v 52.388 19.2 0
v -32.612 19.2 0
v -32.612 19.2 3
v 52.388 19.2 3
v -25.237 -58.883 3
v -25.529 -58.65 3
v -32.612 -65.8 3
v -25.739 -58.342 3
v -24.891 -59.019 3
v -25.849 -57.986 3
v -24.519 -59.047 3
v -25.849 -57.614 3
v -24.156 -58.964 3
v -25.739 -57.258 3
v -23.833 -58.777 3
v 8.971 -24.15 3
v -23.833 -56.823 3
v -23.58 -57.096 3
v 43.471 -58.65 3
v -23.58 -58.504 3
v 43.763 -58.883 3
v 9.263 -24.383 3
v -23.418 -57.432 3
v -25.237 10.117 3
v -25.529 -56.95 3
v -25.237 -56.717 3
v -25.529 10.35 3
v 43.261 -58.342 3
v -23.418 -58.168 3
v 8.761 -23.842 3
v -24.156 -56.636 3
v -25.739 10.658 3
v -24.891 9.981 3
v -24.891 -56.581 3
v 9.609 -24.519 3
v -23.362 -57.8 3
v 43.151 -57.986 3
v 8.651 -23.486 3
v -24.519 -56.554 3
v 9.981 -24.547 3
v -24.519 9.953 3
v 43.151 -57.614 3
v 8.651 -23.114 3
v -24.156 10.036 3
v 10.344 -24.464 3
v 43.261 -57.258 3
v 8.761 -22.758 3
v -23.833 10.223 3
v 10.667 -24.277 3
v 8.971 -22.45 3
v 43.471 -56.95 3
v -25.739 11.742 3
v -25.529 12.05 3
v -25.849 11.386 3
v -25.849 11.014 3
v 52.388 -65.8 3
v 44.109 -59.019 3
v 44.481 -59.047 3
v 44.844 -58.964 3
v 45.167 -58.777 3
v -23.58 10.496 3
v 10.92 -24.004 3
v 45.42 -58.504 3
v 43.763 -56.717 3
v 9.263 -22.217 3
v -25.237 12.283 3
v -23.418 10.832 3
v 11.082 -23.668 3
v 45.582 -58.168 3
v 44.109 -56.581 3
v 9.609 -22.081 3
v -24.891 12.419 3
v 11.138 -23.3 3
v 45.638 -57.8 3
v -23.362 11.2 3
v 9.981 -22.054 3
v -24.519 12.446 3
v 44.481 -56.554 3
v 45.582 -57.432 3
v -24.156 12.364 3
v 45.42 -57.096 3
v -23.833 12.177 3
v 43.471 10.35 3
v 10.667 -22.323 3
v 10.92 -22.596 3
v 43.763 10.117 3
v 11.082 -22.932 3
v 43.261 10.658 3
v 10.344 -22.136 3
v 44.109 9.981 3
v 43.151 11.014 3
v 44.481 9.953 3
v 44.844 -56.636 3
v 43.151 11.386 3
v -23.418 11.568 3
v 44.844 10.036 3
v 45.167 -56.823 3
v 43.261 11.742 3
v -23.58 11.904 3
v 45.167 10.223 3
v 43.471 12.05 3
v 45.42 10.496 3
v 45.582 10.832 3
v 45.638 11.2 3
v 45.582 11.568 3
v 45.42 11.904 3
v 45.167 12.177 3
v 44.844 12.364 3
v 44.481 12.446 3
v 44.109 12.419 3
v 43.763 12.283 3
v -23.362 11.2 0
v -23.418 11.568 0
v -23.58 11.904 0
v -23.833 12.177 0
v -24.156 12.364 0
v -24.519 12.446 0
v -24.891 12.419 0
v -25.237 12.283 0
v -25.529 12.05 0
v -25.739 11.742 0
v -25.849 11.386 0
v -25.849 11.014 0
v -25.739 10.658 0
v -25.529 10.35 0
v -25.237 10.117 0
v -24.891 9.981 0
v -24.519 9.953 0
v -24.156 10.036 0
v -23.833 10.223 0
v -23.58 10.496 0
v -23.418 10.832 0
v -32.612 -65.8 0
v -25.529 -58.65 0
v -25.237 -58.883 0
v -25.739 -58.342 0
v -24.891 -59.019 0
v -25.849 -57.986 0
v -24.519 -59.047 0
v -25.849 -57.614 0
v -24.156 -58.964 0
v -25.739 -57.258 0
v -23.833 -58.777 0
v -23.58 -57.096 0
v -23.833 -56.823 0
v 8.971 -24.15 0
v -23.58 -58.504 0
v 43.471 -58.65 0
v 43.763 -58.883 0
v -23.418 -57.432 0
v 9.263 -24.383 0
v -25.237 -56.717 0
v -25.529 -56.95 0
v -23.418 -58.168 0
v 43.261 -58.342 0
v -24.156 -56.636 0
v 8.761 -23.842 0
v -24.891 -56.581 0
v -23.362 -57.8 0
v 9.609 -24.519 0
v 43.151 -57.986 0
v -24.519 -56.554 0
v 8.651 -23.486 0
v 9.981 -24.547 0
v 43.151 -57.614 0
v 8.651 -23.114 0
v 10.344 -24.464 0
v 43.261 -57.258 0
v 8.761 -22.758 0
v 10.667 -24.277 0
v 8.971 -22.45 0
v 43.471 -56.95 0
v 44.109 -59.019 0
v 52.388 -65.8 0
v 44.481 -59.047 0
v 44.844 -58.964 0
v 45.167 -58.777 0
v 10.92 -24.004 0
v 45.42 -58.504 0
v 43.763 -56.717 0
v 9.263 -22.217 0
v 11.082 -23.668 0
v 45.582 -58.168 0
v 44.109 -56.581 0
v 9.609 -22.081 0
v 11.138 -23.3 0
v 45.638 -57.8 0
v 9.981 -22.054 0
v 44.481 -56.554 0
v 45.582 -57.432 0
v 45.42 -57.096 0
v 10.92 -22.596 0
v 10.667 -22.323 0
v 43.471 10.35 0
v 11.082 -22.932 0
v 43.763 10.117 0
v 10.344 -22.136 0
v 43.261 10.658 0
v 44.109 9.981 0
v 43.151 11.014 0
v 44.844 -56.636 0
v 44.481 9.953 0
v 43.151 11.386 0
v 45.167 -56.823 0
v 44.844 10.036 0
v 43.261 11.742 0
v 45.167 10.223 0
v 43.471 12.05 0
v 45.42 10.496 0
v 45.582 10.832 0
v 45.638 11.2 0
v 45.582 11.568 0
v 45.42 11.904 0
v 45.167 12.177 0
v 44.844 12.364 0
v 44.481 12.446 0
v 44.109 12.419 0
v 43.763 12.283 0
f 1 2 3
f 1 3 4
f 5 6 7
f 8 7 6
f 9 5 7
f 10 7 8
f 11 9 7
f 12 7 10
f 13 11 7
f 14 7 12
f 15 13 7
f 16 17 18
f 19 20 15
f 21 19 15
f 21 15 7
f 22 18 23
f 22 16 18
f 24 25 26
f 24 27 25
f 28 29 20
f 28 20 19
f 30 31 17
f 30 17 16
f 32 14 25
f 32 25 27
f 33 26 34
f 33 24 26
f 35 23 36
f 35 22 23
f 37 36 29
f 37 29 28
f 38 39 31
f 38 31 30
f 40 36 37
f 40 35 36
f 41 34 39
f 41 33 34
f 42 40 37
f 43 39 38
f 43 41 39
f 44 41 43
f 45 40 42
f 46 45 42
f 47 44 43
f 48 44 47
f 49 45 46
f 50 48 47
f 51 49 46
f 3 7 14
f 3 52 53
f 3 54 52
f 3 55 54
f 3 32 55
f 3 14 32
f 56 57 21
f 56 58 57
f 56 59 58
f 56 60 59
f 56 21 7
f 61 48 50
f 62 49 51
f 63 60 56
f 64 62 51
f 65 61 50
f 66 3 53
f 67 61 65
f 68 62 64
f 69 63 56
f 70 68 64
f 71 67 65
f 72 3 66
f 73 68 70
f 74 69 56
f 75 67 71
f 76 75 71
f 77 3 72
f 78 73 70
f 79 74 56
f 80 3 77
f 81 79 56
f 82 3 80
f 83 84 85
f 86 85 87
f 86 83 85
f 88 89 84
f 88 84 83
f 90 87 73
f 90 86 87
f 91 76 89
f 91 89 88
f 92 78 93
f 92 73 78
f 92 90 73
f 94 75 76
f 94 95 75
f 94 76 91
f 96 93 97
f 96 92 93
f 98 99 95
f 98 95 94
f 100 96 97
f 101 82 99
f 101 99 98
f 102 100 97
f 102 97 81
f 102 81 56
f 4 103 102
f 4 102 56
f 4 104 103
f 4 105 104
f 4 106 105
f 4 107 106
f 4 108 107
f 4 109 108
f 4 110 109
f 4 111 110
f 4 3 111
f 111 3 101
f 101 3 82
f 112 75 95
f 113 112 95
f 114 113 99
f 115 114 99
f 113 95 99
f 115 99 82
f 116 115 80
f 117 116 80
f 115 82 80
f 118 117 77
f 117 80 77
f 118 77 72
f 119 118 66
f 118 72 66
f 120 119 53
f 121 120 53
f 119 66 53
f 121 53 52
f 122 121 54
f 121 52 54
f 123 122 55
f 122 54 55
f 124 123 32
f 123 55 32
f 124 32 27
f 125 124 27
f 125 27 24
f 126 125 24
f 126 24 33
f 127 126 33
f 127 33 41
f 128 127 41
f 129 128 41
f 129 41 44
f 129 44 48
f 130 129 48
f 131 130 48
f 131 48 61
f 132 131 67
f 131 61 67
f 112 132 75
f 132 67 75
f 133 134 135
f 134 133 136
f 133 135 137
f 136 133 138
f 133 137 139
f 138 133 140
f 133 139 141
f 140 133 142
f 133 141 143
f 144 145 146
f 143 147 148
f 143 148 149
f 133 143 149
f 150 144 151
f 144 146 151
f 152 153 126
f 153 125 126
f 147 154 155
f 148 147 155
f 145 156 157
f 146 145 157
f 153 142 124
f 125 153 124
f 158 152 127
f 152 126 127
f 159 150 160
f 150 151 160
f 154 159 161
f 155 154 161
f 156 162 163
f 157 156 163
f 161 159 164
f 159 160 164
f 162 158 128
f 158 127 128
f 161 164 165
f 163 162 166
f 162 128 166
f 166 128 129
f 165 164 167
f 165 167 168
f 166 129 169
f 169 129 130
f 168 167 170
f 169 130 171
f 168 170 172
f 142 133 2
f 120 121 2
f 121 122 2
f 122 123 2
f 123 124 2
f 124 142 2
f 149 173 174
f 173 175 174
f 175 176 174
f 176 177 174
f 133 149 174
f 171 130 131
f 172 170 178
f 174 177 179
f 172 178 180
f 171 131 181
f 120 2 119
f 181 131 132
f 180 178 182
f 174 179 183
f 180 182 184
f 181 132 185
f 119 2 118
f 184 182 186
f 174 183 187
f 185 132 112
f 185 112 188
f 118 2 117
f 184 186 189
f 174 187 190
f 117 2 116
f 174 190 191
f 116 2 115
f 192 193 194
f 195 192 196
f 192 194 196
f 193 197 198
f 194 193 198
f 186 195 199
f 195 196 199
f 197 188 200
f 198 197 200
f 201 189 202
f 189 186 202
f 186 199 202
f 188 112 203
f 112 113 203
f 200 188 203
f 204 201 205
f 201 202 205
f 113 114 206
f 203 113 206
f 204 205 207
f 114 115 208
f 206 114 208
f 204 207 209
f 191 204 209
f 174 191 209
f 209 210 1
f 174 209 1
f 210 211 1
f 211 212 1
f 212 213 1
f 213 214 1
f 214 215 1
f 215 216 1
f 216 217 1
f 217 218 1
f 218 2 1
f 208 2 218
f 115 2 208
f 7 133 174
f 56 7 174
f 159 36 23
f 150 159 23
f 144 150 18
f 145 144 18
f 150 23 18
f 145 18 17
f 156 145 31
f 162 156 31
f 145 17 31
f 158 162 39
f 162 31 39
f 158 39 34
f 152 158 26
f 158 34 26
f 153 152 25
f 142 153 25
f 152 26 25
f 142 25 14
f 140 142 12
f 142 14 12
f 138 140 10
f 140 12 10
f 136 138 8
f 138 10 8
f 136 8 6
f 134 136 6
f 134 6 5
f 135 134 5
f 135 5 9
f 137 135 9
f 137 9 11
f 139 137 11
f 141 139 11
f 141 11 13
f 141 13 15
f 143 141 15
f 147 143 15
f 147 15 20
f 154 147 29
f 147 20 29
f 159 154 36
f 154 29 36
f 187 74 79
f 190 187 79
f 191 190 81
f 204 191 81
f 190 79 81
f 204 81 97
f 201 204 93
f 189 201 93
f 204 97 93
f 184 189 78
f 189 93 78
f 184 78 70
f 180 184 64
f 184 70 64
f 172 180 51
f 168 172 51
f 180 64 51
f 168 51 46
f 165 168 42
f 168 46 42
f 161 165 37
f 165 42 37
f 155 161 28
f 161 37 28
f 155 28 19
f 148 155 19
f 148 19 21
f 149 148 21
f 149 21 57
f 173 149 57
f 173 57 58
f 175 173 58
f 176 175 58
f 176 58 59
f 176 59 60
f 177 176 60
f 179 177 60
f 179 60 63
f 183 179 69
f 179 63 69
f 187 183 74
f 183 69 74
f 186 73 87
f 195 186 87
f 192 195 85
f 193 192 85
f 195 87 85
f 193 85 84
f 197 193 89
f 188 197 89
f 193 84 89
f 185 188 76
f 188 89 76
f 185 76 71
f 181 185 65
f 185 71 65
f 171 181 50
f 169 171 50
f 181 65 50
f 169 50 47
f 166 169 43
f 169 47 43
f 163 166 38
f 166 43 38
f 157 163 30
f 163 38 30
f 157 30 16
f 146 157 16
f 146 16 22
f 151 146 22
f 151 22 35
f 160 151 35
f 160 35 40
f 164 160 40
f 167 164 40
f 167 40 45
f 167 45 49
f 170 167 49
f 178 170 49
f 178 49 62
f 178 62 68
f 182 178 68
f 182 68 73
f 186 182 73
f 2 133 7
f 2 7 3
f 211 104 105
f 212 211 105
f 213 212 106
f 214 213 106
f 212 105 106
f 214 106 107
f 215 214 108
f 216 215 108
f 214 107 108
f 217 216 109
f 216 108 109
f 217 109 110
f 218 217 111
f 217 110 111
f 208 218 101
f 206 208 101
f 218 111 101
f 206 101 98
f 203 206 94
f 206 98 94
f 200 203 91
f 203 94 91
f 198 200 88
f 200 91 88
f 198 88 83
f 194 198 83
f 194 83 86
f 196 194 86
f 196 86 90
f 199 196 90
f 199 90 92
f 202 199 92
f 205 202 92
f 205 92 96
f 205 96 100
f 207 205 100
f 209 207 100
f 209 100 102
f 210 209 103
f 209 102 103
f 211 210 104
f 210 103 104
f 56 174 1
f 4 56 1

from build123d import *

# Parameters (mm, degrees)
ESQUISSE1_W             = 85
ESQUISSE1_H             = 85
BOSS_EXTRU_1_DEPTH      = 3
ESQUISSE2_R             = 1.25
ENL_V_MAT_EXTRU_1_DEPTH = 3
ESQUISSE3_R             = 1.25
ENL_V_MAT_EXTRU_2_DEPTH = 10


with BuildPart() as part:
    # Esquisse1 → Boss.-Extru.1 (new body)
    with BuildSketch(Plane.XY):
        with Locations((9.887537717, -23.300013855)):
            Rectangle(ESQUISSE1_W, ESQUISSE1_H)
    extrude(amount=BOSS_EXTRU_1_DEPTH)

    # Esquisse2 → Enlèv. mat.-Extru.1 (cut)
    with BuildSketch(Plane.XY.offset(3)):
        with Locations((-24.612462283, 11.199986145)):
            Circle(ESQUISSE2_R)
        with Locations((44.387537717, 11.199986145)):
            Circle(ESQUISSE2_R)
        with Locations((-24.612462283, -57.800013855)):
            Circle(ESQUISSE2_R)
        with Locations((44.387537717, -57.800013855)):
            Circle(ESQUISSE2_R)
    extrude(amount=-ENL_V_MAT_EXTRU_1_DEPTH, mode=Mode.SUBTRACT)

    # Esquisse3 → Enlèv. mat.-Extru.2 (cut)
    with BuildSketch(Plane.XY.offset(3)):
        with Locations((9.887537717, -23.300013855)):
            Circle(ESQUISSE3_R)
    extrude(amount=-ENL_V_MAT_EXTRU_2_DEPTH, mode=Mode.SUBTRACT)


solid = part.part
